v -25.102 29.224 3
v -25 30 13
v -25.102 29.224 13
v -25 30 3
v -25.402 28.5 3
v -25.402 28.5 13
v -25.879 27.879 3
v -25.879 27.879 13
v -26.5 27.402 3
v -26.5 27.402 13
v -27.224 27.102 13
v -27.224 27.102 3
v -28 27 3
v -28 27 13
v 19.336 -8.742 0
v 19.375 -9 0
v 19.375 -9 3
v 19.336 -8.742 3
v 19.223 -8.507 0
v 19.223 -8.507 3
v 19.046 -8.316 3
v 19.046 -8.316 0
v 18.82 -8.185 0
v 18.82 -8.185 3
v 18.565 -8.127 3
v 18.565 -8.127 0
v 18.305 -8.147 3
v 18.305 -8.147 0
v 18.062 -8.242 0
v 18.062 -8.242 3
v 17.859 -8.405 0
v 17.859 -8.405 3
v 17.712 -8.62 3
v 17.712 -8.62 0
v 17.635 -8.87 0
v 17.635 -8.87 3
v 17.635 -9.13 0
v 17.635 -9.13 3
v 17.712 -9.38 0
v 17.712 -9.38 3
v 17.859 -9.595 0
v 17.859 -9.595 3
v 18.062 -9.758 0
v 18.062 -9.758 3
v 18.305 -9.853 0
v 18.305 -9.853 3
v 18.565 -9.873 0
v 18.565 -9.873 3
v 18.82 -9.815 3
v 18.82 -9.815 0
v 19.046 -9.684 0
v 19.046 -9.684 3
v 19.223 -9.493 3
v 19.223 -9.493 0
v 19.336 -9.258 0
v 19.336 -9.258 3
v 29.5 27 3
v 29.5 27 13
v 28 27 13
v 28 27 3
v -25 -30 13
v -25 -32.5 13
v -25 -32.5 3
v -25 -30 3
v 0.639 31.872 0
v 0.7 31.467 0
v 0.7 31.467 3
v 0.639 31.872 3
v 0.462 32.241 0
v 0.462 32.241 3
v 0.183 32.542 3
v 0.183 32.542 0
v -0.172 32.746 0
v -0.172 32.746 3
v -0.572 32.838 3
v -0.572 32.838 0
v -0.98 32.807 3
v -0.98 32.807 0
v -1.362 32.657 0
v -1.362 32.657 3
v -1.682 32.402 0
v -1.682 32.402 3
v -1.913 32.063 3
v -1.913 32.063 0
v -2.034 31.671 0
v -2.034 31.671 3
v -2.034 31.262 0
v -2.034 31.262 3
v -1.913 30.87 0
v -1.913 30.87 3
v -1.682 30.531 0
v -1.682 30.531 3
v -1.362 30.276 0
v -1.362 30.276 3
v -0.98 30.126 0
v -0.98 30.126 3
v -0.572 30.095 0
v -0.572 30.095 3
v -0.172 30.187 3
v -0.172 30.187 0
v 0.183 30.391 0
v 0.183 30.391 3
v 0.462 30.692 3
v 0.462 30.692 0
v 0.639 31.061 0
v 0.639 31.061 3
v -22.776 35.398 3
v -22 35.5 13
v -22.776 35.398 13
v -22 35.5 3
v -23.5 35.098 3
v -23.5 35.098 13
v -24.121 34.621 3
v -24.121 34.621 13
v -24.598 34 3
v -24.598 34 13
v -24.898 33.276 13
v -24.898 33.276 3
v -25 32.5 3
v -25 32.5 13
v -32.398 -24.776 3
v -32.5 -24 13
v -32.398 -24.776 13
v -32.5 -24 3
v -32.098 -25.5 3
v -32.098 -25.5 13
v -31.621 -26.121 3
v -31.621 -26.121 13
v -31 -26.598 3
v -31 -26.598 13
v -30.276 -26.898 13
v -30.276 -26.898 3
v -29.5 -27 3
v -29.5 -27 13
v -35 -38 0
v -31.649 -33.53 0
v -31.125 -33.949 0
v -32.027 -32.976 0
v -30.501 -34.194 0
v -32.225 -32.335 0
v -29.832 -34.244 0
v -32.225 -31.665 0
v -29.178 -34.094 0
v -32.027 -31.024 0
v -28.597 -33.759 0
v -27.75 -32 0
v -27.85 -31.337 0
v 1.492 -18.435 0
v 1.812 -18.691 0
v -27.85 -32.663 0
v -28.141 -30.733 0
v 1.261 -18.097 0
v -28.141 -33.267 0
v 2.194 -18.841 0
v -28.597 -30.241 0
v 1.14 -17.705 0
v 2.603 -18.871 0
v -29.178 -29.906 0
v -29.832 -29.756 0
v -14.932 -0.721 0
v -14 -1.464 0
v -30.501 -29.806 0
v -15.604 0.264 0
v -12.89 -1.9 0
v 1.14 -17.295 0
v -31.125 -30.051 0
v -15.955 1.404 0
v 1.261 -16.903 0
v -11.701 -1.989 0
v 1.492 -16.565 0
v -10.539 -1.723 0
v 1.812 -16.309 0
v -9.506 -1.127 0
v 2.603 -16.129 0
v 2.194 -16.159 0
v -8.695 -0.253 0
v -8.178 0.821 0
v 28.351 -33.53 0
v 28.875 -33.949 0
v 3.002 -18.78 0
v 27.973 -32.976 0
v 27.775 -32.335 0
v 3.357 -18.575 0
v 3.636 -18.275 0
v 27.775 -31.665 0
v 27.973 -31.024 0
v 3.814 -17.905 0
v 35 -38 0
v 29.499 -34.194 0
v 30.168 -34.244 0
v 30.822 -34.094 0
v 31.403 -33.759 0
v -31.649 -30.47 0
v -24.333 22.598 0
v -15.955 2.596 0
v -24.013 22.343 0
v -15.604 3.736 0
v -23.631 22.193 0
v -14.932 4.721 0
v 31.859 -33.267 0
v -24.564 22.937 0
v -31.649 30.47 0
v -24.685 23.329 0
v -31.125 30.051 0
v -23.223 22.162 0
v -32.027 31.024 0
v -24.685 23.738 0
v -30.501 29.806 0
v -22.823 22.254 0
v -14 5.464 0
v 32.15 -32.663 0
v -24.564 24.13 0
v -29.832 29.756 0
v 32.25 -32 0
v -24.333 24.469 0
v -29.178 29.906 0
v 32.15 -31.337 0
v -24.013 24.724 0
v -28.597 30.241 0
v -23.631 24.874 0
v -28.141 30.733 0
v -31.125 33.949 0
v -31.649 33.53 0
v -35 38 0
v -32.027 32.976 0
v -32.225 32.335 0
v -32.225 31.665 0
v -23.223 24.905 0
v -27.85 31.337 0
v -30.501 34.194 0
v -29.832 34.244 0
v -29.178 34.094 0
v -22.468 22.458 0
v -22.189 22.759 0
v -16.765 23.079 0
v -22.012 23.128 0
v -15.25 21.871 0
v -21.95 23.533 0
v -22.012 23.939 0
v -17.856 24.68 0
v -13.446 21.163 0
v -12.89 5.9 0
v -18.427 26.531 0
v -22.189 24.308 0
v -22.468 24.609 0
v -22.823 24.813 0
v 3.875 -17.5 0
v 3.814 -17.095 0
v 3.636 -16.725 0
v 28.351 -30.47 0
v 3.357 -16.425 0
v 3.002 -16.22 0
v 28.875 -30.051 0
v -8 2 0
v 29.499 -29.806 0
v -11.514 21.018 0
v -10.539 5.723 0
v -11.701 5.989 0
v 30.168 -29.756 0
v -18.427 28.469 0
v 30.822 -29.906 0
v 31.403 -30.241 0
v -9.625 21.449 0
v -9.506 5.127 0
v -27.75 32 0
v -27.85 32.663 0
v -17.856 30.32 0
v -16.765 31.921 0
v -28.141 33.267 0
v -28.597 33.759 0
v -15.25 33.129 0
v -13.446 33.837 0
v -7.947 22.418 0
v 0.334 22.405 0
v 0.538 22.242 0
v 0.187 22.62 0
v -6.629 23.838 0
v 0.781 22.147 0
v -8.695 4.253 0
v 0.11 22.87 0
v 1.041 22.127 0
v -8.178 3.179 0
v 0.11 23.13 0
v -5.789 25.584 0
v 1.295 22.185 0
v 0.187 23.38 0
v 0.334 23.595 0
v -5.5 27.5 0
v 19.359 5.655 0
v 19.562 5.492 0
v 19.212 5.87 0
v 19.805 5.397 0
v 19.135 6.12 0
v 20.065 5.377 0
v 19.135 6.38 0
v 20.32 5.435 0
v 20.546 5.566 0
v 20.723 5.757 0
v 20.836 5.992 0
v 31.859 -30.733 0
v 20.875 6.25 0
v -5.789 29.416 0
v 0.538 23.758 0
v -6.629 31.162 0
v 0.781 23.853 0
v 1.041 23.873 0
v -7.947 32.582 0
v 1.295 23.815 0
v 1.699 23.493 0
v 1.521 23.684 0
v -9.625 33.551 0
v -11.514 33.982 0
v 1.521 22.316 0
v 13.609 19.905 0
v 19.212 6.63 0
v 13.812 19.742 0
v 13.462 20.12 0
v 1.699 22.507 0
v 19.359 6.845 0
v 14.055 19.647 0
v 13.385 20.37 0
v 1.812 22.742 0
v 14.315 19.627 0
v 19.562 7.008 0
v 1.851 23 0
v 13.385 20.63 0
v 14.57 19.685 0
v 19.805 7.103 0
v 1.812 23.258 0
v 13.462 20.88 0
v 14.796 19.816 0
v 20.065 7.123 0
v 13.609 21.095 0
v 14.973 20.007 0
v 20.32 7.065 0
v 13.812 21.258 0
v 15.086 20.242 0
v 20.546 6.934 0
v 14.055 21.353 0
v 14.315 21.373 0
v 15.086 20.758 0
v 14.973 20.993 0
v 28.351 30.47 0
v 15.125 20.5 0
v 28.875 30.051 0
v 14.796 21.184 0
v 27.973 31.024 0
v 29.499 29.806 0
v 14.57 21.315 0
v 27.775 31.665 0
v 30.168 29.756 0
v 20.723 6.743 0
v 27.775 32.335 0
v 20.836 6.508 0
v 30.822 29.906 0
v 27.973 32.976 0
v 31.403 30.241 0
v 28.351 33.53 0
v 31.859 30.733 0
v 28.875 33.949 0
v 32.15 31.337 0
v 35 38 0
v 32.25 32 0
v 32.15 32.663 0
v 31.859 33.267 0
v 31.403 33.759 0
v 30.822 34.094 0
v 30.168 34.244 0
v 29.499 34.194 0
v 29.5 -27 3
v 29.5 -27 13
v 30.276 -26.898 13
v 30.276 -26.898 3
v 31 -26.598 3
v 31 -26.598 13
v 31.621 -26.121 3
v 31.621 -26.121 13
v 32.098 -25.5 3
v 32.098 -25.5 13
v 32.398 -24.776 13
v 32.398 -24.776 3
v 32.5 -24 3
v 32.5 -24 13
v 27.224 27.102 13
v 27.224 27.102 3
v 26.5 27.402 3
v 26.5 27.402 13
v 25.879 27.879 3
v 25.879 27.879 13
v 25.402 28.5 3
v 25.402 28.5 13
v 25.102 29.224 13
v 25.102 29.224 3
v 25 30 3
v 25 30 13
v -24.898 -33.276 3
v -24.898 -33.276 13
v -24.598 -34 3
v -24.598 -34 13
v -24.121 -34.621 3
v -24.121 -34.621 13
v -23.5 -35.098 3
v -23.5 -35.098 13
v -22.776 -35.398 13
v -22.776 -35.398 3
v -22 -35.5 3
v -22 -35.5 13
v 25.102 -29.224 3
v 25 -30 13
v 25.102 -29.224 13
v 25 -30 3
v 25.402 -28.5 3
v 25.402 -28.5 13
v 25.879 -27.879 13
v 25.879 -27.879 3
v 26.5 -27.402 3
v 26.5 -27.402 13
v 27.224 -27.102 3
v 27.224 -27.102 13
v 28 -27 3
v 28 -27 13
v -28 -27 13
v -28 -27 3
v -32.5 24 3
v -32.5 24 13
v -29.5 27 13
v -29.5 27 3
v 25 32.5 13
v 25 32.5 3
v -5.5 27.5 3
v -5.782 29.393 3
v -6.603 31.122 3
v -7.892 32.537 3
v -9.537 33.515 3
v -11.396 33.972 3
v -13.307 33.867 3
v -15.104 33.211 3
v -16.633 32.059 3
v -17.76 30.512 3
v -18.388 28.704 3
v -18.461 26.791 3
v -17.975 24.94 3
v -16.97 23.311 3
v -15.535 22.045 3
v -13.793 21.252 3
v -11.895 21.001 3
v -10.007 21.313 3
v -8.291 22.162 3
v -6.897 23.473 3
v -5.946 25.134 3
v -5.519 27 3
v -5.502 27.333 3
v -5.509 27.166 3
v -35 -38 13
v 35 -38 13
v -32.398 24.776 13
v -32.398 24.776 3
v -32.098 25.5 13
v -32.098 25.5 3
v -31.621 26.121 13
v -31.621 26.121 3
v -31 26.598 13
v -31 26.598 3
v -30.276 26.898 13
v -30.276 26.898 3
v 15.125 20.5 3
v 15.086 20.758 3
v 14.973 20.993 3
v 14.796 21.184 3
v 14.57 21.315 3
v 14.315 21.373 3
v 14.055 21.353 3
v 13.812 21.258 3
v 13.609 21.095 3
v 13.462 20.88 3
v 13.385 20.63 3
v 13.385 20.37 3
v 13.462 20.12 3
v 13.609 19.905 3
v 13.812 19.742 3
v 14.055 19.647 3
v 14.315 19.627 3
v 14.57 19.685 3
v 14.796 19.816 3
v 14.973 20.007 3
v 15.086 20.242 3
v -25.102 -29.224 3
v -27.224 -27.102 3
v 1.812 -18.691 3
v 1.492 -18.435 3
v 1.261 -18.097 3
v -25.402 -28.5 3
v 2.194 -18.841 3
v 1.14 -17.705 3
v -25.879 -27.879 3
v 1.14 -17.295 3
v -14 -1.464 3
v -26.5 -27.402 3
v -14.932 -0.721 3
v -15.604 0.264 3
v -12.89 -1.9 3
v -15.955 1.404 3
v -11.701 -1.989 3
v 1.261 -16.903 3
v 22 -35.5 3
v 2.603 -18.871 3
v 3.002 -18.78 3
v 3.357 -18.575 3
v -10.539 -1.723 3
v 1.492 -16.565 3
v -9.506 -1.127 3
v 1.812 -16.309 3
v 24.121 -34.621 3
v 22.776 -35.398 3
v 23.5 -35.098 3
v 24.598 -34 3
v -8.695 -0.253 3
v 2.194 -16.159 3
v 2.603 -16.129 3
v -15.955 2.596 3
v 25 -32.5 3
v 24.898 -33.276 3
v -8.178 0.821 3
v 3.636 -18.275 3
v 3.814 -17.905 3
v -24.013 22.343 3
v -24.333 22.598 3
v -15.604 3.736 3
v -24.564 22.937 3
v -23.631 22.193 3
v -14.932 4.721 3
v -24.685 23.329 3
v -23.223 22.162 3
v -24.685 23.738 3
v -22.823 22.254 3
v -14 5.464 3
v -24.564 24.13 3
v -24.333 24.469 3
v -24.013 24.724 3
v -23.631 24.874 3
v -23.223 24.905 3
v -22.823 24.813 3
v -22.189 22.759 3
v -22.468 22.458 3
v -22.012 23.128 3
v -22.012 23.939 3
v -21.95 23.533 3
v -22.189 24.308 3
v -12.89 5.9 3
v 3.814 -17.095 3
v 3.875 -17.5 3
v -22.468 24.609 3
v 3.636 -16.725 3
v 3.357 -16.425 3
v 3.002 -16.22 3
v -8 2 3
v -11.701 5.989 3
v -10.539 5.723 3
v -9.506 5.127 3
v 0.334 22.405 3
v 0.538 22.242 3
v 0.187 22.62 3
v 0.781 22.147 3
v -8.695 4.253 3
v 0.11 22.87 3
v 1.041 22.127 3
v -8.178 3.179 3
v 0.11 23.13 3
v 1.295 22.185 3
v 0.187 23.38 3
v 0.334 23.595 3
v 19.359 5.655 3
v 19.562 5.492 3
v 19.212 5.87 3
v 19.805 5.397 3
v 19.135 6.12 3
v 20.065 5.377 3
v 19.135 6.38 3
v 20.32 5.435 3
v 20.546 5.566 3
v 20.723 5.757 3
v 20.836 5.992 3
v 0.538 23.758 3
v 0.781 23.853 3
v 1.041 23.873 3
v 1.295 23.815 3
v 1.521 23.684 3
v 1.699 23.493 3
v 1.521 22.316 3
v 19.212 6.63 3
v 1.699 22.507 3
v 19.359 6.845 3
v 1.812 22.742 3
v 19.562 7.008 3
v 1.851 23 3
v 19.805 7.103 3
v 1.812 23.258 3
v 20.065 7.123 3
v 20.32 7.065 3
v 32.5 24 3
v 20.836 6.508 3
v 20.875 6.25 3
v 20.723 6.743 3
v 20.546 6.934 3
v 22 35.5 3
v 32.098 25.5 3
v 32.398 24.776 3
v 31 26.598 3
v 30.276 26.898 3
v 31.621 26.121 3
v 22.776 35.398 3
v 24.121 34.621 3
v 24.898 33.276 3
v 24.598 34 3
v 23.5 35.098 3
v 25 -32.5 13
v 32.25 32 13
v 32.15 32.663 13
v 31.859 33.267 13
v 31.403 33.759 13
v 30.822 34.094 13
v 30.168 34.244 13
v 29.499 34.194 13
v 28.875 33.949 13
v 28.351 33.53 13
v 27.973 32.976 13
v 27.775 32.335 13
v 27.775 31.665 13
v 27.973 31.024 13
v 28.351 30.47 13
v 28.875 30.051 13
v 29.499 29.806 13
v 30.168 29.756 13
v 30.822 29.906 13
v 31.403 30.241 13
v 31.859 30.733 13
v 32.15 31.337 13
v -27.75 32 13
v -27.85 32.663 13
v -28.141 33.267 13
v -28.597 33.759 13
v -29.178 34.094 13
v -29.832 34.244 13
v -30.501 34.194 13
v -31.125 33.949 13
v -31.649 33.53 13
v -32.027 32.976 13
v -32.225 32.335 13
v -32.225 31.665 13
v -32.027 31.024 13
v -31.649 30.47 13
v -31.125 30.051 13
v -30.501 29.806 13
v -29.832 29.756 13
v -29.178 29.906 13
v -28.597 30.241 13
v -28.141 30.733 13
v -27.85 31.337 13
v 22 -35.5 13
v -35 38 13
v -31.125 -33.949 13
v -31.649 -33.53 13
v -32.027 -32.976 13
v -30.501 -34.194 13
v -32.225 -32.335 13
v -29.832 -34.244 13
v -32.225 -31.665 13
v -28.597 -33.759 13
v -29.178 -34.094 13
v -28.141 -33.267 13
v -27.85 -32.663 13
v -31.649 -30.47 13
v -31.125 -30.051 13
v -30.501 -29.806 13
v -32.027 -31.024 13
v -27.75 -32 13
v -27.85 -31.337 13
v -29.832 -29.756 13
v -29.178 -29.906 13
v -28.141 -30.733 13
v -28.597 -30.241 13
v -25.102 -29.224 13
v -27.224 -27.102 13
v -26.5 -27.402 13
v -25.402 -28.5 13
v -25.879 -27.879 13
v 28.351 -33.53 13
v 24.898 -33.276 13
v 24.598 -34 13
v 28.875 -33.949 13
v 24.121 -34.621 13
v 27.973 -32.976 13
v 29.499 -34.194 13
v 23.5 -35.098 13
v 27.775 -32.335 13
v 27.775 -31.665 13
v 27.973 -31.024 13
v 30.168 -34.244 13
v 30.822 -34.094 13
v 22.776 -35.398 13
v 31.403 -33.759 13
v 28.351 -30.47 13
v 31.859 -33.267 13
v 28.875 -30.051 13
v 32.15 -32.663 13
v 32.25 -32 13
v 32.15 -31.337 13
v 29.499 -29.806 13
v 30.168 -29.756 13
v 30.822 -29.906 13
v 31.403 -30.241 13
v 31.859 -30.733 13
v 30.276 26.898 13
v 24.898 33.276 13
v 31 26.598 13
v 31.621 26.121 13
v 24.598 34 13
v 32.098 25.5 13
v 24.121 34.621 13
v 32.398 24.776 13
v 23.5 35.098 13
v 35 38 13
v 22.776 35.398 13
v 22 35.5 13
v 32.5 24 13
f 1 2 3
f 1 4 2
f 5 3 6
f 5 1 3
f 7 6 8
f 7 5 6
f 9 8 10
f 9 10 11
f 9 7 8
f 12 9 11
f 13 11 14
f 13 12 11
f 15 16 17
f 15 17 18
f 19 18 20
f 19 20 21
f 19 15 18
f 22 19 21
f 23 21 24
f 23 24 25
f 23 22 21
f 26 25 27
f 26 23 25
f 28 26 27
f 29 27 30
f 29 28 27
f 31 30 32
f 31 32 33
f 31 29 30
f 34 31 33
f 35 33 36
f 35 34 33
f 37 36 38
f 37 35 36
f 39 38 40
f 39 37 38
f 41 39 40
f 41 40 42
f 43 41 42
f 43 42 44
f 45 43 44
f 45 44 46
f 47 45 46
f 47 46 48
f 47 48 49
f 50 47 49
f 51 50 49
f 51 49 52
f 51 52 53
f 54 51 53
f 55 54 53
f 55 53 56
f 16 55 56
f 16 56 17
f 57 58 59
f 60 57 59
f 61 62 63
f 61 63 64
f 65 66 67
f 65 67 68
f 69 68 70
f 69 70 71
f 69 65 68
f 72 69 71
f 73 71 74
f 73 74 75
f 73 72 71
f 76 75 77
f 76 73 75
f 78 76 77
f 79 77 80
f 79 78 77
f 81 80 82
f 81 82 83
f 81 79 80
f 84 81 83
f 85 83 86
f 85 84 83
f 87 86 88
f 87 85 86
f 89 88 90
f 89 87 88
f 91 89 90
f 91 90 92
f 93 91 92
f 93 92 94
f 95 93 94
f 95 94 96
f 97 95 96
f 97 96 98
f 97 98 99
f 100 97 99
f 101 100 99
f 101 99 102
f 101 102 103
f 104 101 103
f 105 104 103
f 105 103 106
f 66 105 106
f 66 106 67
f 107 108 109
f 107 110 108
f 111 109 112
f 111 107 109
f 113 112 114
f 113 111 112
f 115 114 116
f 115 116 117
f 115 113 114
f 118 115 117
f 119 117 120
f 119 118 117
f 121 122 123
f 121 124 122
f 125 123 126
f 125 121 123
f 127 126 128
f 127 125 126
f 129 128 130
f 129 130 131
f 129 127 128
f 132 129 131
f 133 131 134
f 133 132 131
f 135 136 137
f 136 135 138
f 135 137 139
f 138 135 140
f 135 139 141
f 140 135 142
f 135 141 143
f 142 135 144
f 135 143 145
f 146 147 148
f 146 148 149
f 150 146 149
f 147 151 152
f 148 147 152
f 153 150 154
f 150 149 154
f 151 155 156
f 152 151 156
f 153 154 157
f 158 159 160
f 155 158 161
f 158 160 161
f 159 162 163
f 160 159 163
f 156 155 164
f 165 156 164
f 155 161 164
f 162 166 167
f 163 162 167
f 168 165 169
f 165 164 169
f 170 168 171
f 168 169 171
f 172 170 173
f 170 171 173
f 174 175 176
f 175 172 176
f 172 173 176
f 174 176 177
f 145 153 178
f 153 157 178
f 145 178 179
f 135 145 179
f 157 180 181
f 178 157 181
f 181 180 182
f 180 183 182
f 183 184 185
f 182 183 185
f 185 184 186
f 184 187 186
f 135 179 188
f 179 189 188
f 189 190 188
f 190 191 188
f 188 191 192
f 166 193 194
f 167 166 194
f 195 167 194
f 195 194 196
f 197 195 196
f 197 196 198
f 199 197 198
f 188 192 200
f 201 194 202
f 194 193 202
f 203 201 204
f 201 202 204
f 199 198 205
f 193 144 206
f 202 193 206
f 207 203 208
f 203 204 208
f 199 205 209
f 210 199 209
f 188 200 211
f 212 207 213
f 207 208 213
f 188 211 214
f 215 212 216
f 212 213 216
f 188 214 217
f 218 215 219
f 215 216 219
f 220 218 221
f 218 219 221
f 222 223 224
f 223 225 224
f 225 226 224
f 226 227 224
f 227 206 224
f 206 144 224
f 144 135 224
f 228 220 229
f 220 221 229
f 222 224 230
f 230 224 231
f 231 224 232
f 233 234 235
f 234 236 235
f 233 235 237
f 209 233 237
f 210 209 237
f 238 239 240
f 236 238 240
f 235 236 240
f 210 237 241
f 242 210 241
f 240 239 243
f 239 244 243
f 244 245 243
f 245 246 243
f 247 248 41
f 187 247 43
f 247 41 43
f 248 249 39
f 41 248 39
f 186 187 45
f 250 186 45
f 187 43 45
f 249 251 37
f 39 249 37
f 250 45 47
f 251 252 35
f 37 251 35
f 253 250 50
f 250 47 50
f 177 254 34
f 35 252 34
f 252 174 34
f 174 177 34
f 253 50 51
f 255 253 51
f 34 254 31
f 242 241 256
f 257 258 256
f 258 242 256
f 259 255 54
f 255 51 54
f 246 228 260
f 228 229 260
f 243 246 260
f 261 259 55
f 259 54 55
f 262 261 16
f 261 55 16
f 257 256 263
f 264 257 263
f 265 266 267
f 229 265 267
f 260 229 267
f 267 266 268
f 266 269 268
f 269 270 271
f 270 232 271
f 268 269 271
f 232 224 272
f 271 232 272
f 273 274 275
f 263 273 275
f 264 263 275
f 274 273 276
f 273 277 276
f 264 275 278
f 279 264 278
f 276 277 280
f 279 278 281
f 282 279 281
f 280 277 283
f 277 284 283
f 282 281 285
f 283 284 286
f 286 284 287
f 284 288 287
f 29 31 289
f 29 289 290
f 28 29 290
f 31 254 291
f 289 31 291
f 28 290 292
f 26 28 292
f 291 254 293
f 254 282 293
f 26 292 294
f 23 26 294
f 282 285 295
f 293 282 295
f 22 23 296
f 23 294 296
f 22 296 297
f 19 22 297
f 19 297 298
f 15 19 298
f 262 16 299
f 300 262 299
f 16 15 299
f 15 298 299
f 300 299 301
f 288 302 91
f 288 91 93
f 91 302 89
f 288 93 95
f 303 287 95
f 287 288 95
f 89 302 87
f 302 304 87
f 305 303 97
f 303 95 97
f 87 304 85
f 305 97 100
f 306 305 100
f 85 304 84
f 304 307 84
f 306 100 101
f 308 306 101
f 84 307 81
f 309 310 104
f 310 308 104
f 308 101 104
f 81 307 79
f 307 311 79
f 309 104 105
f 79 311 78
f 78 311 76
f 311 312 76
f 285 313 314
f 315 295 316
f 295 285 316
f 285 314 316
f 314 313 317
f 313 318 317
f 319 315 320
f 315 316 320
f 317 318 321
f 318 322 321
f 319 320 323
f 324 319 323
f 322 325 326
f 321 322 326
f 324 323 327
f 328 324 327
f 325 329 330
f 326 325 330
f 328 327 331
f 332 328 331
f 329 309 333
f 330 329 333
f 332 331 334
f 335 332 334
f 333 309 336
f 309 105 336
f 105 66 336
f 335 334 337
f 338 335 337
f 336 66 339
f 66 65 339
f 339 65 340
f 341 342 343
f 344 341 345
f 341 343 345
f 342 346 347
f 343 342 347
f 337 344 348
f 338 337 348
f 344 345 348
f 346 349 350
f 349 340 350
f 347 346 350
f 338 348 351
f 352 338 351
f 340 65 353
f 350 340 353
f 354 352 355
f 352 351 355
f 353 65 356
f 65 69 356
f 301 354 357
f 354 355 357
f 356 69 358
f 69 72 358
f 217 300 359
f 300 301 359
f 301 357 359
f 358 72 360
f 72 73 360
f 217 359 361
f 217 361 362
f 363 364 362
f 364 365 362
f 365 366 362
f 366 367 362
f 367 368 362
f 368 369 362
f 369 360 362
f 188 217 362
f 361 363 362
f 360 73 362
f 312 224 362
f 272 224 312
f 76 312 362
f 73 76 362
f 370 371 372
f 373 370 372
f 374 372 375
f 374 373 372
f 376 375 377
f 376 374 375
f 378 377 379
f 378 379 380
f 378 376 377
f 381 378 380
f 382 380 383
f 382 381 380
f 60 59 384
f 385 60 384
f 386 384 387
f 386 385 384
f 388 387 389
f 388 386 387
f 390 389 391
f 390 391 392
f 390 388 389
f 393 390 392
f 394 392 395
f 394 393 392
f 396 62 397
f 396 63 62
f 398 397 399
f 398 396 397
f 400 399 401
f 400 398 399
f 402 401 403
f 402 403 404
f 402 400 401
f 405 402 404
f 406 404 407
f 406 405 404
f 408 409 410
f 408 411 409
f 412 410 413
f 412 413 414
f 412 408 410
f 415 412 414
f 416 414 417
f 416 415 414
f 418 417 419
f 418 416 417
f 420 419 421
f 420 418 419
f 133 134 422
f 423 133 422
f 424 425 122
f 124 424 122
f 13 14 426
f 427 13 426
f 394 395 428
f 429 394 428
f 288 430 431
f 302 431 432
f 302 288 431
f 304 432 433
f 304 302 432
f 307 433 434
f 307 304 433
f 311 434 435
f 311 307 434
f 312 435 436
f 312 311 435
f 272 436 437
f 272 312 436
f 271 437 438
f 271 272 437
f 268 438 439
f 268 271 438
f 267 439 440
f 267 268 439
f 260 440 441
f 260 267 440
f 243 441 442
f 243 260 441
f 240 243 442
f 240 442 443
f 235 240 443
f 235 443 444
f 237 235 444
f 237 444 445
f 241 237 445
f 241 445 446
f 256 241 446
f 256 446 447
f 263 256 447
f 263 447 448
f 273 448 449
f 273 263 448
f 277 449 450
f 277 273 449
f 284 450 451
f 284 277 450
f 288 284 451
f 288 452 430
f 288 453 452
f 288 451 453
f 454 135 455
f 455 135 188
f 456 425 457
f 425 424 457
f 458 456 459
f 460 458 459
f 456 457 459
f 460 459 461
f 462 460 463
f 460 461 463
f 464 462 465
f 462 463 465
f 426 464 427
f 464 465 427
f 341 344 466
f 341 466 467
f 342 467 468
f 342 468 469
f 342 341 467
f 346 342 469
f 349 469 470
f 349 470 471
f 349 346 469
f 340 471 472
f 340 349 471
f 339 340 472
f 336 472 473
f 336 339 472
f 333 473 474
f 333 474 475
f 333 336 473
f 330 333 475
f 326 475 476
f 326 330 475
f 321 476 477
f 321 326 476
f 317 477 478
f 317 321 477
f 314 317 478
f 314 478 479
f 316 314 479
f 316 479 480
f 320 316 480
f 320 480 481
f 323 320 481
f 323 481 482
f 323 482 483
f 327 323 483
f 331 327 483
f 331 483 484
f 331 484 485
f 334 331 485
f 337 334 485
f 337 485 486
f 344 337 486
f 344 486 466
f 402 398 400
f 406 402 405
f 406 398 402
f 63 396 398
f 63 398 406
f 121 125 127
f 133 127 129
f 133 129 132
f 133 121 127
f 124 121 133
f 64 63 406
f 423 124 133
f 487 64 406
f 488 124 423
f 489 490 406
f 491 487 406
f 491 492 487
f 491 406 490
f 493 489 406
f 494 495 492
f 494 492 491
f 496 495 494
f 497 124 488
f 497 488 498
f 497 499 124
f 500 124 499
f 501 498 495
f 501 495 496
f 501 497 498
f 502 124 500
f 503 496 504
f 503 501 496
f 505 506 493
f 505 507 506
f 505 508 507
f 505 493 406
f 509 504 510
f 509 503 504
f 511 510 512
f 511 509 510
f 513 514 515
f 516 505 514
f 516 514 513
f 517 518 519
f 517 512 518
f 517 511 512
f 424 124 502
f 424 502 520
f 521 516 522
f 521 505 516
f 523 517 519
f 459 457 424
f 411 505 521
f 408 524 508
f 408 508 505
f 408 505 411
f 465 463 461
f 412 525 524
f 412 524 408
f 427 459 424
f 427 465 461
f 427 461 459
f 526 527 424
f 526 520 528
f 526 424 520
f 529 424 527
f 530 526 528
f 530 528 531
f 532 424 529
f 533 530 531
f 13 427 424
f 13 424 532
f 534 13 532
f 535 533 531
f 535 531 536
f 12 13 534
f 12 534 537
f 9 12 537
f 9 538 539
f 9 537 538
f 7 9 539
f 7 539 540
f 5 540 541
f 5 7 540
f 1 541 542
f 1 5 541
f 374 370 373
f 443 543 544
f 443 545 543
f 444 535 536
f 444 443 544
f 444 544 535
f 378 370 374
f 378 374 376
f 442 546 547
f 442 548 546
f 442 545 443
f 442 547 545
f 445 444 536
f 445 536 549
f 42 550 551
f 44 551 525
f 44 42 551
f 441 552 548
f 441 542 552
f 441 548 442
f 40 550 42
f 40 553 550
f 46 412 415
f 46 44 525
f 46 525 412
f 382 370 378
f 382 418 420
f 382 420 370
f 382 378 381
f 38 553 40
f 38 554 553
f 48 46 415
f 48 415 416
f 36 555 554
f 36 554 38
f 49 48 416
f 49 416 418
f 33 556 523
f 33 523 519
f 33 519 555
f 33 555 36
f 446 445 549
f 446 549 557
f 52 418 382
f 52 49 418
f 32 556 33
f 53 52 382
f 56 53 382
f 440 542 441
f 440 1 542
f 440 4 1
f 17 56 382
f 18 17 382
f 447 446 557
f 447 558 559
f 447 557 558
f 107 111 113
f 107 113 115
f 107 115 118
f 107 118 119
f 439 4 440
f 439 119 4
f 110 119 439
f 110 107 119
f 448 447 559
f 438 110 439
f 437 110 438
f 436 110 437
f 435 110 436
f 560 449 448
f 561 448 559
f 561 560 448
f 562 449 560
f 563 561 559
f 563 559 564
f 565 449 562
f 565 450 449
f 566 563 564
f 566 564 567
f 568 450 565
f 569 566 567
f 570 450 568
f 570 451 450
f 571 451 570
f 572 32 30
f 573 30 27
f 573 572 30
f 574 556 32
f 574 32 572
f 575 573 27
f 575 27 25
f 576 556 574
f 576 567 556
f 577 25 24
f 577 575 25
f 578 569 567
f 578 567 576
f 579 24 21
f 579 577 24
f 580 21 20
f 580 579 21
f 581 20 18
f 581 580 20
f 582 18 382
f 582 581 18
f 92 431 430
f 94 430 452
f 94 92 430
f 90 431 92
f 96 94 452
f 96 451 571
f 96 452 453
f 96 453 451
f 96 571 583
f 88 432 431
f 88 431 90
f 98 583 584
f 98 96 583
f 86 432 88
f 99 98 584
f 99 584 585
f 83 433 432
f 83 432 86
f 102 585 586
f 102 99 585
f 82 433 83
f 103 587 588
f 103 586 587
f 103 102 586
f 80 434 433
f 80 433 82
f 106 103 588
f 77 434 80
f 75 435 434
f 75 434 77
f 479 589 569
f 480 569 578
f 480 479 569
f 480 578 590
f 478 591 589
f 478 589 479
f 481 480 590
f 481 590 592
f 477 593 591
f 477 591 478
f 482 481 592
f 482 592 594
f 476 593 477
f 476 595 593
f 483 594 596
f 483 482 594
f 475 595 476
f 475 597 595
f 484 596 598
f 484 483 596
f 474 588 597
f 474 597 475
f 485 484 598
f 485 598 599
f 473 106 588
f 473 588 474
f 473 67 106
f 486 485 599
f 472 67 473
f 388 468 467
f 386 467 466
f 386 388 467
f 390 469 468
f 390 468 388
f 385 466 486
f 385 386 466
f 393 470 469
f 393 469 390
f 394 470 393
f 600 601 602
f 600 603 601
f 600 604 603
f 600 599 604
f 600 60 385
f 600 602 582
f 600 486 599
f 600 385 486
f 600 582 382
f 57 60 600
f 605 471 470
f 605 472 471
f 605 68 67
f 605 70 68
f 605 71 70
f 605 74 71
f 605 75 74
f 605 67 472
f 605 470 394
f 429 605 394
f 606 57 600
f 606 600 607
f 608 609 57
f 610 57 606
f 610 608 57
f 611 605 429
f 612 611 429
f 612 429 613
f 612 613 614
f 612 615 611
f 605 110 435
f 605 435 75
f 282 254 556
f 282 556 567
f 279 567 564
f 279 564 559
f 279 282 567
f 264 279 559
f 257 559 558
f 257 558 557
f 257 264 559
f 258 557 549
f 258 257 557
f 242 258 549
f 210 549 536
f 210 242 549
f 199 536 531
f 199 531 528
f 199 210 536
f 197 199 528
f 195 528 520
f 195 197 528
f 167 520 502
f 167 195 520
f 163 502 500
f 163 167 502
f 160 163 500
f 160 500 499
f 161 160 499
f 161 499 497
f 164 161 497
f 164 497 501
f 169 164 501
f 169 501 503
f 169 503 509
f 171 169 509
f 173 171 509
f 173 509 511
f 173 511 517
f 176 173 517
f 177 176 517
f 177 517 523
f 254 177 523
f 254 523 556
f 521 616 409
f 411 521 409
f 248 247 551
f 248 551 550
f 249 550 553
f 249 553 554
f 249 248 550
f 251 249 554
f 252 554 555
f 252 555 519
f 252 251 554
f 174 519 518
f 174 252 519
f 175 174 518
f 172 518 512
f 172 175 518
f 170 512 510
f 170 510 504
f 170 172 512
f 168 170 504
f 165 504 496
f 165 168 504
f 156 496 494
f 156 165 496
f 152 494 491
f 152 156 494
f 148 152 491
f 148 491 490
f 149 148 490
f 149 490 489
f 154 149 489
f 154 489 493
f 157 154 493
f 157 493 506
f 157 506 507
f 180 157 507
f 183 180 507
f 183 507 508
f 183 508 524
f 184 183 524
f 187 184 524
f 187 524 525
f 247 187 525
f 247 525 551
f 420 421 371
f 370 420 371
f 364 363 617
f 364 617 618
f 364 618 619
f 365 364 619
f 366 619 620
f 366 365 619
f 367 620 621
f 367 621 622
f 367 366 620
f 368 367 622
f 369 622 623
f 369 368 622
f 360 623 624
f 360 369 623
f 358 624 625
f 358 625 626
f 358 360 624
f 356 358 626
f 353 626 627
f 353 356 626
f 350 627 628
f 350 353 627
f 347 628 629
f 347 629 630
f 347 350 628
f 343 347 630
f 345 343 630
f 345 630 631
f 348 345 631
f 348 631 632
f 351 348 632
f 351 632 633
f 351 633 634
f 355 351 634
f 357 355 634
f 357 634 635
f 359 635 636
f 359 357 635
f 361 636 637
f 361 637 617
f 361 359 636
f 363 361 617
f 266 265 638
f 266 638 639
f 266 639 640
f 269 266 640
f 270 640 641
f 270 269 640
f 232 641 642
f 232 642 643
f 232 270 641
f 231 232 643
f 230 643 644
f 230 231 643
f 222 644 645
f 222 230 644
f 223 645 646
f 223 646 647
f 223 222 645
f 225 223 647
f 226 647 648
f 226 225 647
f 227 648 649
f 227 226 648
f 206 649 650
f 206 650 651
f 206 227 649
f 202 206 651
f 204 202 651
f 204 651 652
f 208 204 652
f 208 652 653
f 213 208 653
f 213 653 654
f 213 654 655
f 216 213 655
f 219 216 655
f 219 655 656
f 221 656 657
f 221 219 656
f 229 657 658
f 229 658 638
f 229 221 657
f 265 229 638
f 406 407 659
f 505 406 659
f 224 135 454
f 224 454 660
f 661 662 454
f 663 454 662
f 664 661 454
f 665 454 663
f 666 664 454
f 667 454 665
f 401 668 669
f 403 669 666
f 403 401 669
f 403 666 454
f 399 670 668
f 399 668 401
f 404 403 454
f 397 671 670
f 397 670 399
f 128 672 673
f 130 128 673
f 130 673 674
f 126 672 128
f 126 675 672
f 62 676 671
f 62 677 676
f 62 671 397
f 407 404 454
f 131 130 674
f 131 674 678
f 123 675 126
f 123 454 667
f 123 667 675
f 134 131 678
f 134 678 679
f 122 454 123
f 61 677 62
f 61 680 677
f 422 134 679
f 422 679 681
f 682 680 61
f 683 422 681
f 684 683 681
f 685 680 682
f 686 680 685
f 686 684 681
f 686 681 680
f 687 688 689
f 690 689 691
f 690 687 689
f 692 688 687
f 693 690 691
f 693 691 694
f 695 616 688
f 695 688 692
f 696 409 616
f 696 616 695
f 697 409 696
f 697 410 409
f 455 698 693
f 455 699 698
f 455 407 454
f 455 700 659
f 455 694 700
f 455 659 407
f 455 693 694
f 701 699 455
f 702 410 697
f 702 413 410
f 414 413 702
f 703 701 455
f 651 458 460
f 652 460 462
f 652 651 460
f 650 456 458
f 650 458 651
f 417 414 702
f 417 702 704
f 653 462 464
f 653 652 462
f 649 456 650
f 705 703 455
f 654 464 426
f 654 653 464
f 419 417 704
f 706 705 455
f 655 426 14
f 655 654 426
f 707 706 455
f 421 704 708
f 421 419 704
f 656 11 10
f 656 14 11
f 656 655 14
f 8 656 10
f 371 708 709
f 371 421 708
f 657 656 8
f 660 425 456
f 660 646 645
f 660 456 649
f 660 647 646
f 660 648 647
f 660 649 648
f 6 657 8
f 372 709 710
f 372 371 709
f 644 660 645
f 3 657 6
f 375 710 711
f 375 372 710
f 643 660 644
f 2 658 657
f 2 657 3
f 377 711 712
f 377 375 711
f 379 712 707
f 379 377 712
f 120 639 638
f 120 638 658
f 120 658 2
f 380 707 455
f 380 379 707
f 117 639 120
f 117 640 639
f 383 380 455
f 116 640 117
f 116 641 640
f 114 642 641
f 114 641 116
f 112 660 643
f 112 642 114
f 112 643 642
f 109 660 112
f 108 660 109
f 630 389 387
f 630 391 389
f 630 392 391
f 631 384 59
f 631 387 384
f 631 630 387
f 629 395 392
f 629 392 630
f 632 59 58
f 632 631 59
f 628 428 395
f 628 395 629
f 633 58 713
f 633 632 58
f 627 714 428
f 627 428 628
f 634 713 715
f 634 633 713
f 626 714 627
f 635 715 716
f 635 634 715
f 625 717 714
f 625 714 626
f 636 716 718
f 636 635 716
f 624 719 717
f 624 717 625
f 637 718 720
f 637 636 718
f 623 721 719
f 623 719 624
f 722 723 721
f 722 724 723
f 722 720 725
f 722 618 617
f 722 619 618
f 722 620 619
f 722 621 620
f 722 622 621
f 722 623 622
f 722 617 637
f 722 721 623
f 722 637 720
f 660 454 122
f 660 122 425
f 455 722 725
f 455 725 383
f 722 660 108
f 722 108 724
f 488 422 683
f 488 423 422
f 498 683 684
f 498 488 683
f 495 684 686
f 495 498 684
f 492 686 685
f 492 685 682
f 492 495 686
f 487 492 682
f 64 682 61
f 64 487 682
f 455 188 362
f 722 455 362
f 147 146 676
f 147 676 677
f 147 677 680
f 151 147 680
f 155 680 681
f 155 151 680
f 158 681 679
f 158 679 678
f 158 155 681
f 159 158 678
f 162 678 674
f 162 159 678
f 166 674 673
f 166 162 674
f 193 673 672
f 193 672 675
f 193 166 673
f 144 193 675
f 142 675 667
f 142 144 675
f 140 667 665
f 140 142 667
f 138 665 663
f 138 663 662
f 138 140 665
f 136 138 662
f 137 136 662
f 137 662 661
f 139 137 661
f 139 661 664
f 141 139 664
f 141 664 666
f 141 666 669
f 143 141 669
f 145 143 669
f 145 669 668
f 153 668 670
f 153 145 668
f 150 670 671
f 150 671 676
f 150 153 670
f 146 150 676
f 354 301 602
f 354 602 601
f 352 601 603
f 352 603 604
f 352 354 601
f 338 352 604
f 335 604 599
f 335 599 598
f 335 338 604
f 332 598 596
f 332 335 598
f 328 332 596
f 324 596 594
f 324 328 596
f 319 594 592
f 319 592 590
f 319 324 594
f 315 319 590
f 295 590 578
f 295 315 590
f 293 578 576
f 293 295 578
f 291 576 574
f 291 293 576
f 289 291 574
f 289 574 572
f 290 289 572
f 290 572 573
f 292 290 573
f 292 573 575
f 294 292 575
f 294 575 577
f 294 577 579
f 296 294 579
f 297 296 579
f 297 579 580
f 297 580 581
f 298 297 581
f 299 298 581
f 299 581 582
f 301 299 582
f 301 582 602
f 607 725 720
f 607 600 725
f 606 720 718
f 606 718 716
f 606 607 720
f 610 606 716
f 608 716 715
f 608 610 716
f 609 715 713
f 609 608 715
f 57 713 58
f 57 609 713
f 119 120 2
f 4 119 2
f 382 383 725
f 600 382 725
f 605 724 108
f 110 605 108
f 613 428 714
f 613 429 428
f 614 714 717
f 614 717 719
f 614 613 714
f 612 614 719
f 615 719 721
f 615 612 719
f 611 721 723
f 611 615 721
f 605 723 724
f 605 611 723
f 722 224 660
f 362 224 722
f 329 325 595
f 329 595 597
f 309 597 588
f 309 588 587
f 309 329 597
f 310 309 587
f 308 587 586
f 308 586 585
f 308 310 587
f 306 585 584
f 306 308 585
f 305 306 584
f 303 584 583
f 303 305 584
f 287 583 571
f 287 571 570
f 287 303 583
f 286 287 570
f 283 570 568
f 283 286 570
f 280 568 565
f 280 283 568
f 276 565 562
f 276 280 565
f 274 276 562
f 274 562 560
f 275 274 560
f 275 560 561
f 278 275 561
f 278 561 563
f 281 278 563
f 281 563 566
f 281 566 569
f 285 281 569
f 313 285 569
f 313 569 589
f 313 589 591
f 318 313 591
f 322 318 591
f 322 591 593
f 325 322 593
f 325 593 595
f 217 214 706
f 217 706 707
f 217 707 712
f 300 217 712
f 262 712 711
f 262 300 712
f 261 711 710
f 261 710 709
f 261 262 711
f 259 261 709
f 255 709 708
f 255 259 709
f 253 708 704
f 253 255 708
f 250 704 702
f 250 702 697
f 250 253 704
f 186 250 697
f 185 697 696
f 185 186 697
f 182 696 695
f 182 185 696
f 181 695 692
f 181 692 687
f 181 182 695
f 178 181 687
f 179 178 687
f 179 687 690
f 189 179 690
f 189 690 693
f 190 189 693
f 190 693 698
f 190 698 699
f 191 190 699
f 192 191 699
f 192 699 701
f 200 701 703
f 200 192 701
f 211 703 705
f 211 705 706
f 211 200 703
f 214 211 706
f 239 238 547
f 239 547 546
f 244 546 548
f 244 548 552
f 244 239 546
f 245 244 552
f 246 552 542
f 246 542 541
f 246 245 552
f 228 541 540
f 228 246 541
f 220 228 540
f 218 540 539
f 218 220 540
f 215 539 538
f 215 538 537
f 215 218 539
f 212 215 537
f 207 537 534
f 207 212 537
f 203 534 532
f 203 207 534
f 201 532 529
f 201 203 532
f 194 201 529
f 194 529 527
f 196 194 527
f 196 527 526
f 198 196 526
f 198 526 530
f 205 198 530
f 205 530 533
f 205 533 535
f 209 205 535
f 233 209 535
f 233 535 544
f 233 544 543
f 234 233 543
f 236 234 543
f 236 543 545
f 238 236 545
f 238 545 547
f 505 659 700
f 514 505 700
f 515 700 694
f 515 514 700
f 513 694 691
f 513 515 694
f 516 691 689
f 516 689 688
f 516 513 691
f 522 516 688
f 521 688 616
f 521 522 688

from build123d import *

# Parameters (mm, degrees)
F0_W     = 70
F0_H     = 76
F0_R     = 2.25
F0_R_2   = 1.375
F0_R_3   = 0.875
F0_R_4   = 4
F0_R_5   = 6.5
F1_DEPTH = 13
F2_R     = 1.375
F2_R_2   = 0.875
F2_R_3   = 4
F2_W     = 50
F2_H     = 8.5
F3_DEPTH = 10
F4_R     = 3


with BuildPart() as f1:
    # F0 (on Top) → F1 (new body)
    with BuildSketch(Plane.XY):
        Rectangle(F0_W, F0_H)
        with Locations((-30, -32)):
            Circle(F0_R, mode=Mode.SUBTRACT)
        with Locations((30, -32)):
            Circle(F0_R, mode=Mode.SUBTRACT)
        with Locations((2.5, -17.5)):
            Circle(F0_R_2, mode=Mode.SUBTRACT)
        with Locations((18.5, -9)):
            Circle(F0_R_3, mode=Mode.SUBTRACT)
        with Locations((-12, 2)):
            Circle(F0_R_4, mode=Mode.SUBTRACT)
        with Locations((-23.325496177, 23.5334982232)):
            Circle(F0_R_2, mode=Mode.SUBTRACT)
        with Locations((-30, 32)):
            Circle(F0_R, mode=Mode.SUBTRACT)
        with Locations((-12, 27.5)):
            Circle(F0_R_5, mode=Mode.SUBTRACT)
        with Locations((-0.674503823, 31.4665017768)):
            Circle(F0_R_2, mode=Mode.SUBTRACT)
        with Locations((20, 6.25)):
            Circle(F0_R_3, mode=Mode.SUBTRACT)
        with Locations((0.9756591943, 23)):
            Circle(F0_R_3, mode=Mode.SUBTRACT)
        with Locations((14.25, 20.5)):
            Circle(F0_R_3, mode=Mode.SUBTRACT)
        with Locations((30, 32)):
            Circle(F0_R, mode=Mode.SUBTRACT)
    extrude(amount=F1_DEPTH)

    # F2 (on face) → F3 (cut)
    with BuildSketch(Plane.XY.offset(13)):
        with BuildLine():
            Line((-25, 27), (-32.5, 27))
            Line((-32.5, 27), (-32.5, -27))
            Line((-32.5, -27), (-25, -27))
            Line((-25, -27), (25, -27))
            Line((25, -27), (32.5, -27))
            Line((32.5, -27), (32.5, 27))
            Line((32.5, 27), (25, 27))
            Line((25, 27), (-5.5192593016, 27))
            ThreePointArc((-5.5192593016, 27), (-12, 21), (-18.4807406984, 27))
            Line((-18.4807406984, 27), (-25, 27))
        make_face()
        with Locations((2.5, -17.5)):
            Circle(F2_R, mode=Mode.SUBTRACT)
        with Locations((18.5, -9)):
            Circle(F2_R_2, mode=Mode.SUBTRACT)
        with Locations((-12, 2)):
            Circle(F2_R_3, mode=Mode.SUBTRACT)
        with Locations((-23.325496177, 23.5334982232)):
            Circle(F2_R, mode=Mode.SUBTRACT)
        with Locations((20, 6.25)):
            Circle(F2_R_2, mode=Mode.SUBTRACT)
        with Locations((0.9756591943, 23)):
            Circle(F2_R_2, mode=Mode.SUBTRACT)
        with Locations((14.25, 20.5)):
            Circle(F2_R_2, mode=Mode.SUBTRACT)
        with BuildLine():
            Line((-25, 35.5), (-25, 27))
            Line((-25, 27), (-18.4807406984, 27))
            ThreePointArc((-18.4807406984, 27), (-12.2501853916, 33.99518339), (-5.5, 27.5))
            ThreePointArc((-5.5, 27.5), (-5.50481661, 27.2498146084), (-5.5192593016, 27))
            Line((-5.5192593016, 27), (25, 27))
            Line((25, 27), (25, 35.5))
            Line((25, 35.5), (-25, 35.5))
        make_face()
        with Locations((-0.674503823, 31.4665017768)):
            Circle(F2_R, mode=Mode.SUBTRACT)
        with Locations((0, -31.25)):
            Rectangle(F2_W, F2_H)
    extrude(amount=-F3_DEPTH, mode=Mode.SUBTRACT)

    # F4
    f4_edges = [f1.edges().sort_by_distance(p)[0] for p in [
        (-25, 27, 8),
        (25, 27, 8),
        (-25, -27, 8),
        (25, -27, 8),
        (32.5, -27, 8),
        (32.5, 27, 8),
        (25, 35.5, 8),
        (-25, 35.5, 8),
        (-32.5, 27, 8),
        (-32.5, -27, 8),
        (-25, -35.5, 8),
        (25, -35.5, 8),
    ]]
    fillet(f4_edges, radius=F4_R)


solid = f1.part
